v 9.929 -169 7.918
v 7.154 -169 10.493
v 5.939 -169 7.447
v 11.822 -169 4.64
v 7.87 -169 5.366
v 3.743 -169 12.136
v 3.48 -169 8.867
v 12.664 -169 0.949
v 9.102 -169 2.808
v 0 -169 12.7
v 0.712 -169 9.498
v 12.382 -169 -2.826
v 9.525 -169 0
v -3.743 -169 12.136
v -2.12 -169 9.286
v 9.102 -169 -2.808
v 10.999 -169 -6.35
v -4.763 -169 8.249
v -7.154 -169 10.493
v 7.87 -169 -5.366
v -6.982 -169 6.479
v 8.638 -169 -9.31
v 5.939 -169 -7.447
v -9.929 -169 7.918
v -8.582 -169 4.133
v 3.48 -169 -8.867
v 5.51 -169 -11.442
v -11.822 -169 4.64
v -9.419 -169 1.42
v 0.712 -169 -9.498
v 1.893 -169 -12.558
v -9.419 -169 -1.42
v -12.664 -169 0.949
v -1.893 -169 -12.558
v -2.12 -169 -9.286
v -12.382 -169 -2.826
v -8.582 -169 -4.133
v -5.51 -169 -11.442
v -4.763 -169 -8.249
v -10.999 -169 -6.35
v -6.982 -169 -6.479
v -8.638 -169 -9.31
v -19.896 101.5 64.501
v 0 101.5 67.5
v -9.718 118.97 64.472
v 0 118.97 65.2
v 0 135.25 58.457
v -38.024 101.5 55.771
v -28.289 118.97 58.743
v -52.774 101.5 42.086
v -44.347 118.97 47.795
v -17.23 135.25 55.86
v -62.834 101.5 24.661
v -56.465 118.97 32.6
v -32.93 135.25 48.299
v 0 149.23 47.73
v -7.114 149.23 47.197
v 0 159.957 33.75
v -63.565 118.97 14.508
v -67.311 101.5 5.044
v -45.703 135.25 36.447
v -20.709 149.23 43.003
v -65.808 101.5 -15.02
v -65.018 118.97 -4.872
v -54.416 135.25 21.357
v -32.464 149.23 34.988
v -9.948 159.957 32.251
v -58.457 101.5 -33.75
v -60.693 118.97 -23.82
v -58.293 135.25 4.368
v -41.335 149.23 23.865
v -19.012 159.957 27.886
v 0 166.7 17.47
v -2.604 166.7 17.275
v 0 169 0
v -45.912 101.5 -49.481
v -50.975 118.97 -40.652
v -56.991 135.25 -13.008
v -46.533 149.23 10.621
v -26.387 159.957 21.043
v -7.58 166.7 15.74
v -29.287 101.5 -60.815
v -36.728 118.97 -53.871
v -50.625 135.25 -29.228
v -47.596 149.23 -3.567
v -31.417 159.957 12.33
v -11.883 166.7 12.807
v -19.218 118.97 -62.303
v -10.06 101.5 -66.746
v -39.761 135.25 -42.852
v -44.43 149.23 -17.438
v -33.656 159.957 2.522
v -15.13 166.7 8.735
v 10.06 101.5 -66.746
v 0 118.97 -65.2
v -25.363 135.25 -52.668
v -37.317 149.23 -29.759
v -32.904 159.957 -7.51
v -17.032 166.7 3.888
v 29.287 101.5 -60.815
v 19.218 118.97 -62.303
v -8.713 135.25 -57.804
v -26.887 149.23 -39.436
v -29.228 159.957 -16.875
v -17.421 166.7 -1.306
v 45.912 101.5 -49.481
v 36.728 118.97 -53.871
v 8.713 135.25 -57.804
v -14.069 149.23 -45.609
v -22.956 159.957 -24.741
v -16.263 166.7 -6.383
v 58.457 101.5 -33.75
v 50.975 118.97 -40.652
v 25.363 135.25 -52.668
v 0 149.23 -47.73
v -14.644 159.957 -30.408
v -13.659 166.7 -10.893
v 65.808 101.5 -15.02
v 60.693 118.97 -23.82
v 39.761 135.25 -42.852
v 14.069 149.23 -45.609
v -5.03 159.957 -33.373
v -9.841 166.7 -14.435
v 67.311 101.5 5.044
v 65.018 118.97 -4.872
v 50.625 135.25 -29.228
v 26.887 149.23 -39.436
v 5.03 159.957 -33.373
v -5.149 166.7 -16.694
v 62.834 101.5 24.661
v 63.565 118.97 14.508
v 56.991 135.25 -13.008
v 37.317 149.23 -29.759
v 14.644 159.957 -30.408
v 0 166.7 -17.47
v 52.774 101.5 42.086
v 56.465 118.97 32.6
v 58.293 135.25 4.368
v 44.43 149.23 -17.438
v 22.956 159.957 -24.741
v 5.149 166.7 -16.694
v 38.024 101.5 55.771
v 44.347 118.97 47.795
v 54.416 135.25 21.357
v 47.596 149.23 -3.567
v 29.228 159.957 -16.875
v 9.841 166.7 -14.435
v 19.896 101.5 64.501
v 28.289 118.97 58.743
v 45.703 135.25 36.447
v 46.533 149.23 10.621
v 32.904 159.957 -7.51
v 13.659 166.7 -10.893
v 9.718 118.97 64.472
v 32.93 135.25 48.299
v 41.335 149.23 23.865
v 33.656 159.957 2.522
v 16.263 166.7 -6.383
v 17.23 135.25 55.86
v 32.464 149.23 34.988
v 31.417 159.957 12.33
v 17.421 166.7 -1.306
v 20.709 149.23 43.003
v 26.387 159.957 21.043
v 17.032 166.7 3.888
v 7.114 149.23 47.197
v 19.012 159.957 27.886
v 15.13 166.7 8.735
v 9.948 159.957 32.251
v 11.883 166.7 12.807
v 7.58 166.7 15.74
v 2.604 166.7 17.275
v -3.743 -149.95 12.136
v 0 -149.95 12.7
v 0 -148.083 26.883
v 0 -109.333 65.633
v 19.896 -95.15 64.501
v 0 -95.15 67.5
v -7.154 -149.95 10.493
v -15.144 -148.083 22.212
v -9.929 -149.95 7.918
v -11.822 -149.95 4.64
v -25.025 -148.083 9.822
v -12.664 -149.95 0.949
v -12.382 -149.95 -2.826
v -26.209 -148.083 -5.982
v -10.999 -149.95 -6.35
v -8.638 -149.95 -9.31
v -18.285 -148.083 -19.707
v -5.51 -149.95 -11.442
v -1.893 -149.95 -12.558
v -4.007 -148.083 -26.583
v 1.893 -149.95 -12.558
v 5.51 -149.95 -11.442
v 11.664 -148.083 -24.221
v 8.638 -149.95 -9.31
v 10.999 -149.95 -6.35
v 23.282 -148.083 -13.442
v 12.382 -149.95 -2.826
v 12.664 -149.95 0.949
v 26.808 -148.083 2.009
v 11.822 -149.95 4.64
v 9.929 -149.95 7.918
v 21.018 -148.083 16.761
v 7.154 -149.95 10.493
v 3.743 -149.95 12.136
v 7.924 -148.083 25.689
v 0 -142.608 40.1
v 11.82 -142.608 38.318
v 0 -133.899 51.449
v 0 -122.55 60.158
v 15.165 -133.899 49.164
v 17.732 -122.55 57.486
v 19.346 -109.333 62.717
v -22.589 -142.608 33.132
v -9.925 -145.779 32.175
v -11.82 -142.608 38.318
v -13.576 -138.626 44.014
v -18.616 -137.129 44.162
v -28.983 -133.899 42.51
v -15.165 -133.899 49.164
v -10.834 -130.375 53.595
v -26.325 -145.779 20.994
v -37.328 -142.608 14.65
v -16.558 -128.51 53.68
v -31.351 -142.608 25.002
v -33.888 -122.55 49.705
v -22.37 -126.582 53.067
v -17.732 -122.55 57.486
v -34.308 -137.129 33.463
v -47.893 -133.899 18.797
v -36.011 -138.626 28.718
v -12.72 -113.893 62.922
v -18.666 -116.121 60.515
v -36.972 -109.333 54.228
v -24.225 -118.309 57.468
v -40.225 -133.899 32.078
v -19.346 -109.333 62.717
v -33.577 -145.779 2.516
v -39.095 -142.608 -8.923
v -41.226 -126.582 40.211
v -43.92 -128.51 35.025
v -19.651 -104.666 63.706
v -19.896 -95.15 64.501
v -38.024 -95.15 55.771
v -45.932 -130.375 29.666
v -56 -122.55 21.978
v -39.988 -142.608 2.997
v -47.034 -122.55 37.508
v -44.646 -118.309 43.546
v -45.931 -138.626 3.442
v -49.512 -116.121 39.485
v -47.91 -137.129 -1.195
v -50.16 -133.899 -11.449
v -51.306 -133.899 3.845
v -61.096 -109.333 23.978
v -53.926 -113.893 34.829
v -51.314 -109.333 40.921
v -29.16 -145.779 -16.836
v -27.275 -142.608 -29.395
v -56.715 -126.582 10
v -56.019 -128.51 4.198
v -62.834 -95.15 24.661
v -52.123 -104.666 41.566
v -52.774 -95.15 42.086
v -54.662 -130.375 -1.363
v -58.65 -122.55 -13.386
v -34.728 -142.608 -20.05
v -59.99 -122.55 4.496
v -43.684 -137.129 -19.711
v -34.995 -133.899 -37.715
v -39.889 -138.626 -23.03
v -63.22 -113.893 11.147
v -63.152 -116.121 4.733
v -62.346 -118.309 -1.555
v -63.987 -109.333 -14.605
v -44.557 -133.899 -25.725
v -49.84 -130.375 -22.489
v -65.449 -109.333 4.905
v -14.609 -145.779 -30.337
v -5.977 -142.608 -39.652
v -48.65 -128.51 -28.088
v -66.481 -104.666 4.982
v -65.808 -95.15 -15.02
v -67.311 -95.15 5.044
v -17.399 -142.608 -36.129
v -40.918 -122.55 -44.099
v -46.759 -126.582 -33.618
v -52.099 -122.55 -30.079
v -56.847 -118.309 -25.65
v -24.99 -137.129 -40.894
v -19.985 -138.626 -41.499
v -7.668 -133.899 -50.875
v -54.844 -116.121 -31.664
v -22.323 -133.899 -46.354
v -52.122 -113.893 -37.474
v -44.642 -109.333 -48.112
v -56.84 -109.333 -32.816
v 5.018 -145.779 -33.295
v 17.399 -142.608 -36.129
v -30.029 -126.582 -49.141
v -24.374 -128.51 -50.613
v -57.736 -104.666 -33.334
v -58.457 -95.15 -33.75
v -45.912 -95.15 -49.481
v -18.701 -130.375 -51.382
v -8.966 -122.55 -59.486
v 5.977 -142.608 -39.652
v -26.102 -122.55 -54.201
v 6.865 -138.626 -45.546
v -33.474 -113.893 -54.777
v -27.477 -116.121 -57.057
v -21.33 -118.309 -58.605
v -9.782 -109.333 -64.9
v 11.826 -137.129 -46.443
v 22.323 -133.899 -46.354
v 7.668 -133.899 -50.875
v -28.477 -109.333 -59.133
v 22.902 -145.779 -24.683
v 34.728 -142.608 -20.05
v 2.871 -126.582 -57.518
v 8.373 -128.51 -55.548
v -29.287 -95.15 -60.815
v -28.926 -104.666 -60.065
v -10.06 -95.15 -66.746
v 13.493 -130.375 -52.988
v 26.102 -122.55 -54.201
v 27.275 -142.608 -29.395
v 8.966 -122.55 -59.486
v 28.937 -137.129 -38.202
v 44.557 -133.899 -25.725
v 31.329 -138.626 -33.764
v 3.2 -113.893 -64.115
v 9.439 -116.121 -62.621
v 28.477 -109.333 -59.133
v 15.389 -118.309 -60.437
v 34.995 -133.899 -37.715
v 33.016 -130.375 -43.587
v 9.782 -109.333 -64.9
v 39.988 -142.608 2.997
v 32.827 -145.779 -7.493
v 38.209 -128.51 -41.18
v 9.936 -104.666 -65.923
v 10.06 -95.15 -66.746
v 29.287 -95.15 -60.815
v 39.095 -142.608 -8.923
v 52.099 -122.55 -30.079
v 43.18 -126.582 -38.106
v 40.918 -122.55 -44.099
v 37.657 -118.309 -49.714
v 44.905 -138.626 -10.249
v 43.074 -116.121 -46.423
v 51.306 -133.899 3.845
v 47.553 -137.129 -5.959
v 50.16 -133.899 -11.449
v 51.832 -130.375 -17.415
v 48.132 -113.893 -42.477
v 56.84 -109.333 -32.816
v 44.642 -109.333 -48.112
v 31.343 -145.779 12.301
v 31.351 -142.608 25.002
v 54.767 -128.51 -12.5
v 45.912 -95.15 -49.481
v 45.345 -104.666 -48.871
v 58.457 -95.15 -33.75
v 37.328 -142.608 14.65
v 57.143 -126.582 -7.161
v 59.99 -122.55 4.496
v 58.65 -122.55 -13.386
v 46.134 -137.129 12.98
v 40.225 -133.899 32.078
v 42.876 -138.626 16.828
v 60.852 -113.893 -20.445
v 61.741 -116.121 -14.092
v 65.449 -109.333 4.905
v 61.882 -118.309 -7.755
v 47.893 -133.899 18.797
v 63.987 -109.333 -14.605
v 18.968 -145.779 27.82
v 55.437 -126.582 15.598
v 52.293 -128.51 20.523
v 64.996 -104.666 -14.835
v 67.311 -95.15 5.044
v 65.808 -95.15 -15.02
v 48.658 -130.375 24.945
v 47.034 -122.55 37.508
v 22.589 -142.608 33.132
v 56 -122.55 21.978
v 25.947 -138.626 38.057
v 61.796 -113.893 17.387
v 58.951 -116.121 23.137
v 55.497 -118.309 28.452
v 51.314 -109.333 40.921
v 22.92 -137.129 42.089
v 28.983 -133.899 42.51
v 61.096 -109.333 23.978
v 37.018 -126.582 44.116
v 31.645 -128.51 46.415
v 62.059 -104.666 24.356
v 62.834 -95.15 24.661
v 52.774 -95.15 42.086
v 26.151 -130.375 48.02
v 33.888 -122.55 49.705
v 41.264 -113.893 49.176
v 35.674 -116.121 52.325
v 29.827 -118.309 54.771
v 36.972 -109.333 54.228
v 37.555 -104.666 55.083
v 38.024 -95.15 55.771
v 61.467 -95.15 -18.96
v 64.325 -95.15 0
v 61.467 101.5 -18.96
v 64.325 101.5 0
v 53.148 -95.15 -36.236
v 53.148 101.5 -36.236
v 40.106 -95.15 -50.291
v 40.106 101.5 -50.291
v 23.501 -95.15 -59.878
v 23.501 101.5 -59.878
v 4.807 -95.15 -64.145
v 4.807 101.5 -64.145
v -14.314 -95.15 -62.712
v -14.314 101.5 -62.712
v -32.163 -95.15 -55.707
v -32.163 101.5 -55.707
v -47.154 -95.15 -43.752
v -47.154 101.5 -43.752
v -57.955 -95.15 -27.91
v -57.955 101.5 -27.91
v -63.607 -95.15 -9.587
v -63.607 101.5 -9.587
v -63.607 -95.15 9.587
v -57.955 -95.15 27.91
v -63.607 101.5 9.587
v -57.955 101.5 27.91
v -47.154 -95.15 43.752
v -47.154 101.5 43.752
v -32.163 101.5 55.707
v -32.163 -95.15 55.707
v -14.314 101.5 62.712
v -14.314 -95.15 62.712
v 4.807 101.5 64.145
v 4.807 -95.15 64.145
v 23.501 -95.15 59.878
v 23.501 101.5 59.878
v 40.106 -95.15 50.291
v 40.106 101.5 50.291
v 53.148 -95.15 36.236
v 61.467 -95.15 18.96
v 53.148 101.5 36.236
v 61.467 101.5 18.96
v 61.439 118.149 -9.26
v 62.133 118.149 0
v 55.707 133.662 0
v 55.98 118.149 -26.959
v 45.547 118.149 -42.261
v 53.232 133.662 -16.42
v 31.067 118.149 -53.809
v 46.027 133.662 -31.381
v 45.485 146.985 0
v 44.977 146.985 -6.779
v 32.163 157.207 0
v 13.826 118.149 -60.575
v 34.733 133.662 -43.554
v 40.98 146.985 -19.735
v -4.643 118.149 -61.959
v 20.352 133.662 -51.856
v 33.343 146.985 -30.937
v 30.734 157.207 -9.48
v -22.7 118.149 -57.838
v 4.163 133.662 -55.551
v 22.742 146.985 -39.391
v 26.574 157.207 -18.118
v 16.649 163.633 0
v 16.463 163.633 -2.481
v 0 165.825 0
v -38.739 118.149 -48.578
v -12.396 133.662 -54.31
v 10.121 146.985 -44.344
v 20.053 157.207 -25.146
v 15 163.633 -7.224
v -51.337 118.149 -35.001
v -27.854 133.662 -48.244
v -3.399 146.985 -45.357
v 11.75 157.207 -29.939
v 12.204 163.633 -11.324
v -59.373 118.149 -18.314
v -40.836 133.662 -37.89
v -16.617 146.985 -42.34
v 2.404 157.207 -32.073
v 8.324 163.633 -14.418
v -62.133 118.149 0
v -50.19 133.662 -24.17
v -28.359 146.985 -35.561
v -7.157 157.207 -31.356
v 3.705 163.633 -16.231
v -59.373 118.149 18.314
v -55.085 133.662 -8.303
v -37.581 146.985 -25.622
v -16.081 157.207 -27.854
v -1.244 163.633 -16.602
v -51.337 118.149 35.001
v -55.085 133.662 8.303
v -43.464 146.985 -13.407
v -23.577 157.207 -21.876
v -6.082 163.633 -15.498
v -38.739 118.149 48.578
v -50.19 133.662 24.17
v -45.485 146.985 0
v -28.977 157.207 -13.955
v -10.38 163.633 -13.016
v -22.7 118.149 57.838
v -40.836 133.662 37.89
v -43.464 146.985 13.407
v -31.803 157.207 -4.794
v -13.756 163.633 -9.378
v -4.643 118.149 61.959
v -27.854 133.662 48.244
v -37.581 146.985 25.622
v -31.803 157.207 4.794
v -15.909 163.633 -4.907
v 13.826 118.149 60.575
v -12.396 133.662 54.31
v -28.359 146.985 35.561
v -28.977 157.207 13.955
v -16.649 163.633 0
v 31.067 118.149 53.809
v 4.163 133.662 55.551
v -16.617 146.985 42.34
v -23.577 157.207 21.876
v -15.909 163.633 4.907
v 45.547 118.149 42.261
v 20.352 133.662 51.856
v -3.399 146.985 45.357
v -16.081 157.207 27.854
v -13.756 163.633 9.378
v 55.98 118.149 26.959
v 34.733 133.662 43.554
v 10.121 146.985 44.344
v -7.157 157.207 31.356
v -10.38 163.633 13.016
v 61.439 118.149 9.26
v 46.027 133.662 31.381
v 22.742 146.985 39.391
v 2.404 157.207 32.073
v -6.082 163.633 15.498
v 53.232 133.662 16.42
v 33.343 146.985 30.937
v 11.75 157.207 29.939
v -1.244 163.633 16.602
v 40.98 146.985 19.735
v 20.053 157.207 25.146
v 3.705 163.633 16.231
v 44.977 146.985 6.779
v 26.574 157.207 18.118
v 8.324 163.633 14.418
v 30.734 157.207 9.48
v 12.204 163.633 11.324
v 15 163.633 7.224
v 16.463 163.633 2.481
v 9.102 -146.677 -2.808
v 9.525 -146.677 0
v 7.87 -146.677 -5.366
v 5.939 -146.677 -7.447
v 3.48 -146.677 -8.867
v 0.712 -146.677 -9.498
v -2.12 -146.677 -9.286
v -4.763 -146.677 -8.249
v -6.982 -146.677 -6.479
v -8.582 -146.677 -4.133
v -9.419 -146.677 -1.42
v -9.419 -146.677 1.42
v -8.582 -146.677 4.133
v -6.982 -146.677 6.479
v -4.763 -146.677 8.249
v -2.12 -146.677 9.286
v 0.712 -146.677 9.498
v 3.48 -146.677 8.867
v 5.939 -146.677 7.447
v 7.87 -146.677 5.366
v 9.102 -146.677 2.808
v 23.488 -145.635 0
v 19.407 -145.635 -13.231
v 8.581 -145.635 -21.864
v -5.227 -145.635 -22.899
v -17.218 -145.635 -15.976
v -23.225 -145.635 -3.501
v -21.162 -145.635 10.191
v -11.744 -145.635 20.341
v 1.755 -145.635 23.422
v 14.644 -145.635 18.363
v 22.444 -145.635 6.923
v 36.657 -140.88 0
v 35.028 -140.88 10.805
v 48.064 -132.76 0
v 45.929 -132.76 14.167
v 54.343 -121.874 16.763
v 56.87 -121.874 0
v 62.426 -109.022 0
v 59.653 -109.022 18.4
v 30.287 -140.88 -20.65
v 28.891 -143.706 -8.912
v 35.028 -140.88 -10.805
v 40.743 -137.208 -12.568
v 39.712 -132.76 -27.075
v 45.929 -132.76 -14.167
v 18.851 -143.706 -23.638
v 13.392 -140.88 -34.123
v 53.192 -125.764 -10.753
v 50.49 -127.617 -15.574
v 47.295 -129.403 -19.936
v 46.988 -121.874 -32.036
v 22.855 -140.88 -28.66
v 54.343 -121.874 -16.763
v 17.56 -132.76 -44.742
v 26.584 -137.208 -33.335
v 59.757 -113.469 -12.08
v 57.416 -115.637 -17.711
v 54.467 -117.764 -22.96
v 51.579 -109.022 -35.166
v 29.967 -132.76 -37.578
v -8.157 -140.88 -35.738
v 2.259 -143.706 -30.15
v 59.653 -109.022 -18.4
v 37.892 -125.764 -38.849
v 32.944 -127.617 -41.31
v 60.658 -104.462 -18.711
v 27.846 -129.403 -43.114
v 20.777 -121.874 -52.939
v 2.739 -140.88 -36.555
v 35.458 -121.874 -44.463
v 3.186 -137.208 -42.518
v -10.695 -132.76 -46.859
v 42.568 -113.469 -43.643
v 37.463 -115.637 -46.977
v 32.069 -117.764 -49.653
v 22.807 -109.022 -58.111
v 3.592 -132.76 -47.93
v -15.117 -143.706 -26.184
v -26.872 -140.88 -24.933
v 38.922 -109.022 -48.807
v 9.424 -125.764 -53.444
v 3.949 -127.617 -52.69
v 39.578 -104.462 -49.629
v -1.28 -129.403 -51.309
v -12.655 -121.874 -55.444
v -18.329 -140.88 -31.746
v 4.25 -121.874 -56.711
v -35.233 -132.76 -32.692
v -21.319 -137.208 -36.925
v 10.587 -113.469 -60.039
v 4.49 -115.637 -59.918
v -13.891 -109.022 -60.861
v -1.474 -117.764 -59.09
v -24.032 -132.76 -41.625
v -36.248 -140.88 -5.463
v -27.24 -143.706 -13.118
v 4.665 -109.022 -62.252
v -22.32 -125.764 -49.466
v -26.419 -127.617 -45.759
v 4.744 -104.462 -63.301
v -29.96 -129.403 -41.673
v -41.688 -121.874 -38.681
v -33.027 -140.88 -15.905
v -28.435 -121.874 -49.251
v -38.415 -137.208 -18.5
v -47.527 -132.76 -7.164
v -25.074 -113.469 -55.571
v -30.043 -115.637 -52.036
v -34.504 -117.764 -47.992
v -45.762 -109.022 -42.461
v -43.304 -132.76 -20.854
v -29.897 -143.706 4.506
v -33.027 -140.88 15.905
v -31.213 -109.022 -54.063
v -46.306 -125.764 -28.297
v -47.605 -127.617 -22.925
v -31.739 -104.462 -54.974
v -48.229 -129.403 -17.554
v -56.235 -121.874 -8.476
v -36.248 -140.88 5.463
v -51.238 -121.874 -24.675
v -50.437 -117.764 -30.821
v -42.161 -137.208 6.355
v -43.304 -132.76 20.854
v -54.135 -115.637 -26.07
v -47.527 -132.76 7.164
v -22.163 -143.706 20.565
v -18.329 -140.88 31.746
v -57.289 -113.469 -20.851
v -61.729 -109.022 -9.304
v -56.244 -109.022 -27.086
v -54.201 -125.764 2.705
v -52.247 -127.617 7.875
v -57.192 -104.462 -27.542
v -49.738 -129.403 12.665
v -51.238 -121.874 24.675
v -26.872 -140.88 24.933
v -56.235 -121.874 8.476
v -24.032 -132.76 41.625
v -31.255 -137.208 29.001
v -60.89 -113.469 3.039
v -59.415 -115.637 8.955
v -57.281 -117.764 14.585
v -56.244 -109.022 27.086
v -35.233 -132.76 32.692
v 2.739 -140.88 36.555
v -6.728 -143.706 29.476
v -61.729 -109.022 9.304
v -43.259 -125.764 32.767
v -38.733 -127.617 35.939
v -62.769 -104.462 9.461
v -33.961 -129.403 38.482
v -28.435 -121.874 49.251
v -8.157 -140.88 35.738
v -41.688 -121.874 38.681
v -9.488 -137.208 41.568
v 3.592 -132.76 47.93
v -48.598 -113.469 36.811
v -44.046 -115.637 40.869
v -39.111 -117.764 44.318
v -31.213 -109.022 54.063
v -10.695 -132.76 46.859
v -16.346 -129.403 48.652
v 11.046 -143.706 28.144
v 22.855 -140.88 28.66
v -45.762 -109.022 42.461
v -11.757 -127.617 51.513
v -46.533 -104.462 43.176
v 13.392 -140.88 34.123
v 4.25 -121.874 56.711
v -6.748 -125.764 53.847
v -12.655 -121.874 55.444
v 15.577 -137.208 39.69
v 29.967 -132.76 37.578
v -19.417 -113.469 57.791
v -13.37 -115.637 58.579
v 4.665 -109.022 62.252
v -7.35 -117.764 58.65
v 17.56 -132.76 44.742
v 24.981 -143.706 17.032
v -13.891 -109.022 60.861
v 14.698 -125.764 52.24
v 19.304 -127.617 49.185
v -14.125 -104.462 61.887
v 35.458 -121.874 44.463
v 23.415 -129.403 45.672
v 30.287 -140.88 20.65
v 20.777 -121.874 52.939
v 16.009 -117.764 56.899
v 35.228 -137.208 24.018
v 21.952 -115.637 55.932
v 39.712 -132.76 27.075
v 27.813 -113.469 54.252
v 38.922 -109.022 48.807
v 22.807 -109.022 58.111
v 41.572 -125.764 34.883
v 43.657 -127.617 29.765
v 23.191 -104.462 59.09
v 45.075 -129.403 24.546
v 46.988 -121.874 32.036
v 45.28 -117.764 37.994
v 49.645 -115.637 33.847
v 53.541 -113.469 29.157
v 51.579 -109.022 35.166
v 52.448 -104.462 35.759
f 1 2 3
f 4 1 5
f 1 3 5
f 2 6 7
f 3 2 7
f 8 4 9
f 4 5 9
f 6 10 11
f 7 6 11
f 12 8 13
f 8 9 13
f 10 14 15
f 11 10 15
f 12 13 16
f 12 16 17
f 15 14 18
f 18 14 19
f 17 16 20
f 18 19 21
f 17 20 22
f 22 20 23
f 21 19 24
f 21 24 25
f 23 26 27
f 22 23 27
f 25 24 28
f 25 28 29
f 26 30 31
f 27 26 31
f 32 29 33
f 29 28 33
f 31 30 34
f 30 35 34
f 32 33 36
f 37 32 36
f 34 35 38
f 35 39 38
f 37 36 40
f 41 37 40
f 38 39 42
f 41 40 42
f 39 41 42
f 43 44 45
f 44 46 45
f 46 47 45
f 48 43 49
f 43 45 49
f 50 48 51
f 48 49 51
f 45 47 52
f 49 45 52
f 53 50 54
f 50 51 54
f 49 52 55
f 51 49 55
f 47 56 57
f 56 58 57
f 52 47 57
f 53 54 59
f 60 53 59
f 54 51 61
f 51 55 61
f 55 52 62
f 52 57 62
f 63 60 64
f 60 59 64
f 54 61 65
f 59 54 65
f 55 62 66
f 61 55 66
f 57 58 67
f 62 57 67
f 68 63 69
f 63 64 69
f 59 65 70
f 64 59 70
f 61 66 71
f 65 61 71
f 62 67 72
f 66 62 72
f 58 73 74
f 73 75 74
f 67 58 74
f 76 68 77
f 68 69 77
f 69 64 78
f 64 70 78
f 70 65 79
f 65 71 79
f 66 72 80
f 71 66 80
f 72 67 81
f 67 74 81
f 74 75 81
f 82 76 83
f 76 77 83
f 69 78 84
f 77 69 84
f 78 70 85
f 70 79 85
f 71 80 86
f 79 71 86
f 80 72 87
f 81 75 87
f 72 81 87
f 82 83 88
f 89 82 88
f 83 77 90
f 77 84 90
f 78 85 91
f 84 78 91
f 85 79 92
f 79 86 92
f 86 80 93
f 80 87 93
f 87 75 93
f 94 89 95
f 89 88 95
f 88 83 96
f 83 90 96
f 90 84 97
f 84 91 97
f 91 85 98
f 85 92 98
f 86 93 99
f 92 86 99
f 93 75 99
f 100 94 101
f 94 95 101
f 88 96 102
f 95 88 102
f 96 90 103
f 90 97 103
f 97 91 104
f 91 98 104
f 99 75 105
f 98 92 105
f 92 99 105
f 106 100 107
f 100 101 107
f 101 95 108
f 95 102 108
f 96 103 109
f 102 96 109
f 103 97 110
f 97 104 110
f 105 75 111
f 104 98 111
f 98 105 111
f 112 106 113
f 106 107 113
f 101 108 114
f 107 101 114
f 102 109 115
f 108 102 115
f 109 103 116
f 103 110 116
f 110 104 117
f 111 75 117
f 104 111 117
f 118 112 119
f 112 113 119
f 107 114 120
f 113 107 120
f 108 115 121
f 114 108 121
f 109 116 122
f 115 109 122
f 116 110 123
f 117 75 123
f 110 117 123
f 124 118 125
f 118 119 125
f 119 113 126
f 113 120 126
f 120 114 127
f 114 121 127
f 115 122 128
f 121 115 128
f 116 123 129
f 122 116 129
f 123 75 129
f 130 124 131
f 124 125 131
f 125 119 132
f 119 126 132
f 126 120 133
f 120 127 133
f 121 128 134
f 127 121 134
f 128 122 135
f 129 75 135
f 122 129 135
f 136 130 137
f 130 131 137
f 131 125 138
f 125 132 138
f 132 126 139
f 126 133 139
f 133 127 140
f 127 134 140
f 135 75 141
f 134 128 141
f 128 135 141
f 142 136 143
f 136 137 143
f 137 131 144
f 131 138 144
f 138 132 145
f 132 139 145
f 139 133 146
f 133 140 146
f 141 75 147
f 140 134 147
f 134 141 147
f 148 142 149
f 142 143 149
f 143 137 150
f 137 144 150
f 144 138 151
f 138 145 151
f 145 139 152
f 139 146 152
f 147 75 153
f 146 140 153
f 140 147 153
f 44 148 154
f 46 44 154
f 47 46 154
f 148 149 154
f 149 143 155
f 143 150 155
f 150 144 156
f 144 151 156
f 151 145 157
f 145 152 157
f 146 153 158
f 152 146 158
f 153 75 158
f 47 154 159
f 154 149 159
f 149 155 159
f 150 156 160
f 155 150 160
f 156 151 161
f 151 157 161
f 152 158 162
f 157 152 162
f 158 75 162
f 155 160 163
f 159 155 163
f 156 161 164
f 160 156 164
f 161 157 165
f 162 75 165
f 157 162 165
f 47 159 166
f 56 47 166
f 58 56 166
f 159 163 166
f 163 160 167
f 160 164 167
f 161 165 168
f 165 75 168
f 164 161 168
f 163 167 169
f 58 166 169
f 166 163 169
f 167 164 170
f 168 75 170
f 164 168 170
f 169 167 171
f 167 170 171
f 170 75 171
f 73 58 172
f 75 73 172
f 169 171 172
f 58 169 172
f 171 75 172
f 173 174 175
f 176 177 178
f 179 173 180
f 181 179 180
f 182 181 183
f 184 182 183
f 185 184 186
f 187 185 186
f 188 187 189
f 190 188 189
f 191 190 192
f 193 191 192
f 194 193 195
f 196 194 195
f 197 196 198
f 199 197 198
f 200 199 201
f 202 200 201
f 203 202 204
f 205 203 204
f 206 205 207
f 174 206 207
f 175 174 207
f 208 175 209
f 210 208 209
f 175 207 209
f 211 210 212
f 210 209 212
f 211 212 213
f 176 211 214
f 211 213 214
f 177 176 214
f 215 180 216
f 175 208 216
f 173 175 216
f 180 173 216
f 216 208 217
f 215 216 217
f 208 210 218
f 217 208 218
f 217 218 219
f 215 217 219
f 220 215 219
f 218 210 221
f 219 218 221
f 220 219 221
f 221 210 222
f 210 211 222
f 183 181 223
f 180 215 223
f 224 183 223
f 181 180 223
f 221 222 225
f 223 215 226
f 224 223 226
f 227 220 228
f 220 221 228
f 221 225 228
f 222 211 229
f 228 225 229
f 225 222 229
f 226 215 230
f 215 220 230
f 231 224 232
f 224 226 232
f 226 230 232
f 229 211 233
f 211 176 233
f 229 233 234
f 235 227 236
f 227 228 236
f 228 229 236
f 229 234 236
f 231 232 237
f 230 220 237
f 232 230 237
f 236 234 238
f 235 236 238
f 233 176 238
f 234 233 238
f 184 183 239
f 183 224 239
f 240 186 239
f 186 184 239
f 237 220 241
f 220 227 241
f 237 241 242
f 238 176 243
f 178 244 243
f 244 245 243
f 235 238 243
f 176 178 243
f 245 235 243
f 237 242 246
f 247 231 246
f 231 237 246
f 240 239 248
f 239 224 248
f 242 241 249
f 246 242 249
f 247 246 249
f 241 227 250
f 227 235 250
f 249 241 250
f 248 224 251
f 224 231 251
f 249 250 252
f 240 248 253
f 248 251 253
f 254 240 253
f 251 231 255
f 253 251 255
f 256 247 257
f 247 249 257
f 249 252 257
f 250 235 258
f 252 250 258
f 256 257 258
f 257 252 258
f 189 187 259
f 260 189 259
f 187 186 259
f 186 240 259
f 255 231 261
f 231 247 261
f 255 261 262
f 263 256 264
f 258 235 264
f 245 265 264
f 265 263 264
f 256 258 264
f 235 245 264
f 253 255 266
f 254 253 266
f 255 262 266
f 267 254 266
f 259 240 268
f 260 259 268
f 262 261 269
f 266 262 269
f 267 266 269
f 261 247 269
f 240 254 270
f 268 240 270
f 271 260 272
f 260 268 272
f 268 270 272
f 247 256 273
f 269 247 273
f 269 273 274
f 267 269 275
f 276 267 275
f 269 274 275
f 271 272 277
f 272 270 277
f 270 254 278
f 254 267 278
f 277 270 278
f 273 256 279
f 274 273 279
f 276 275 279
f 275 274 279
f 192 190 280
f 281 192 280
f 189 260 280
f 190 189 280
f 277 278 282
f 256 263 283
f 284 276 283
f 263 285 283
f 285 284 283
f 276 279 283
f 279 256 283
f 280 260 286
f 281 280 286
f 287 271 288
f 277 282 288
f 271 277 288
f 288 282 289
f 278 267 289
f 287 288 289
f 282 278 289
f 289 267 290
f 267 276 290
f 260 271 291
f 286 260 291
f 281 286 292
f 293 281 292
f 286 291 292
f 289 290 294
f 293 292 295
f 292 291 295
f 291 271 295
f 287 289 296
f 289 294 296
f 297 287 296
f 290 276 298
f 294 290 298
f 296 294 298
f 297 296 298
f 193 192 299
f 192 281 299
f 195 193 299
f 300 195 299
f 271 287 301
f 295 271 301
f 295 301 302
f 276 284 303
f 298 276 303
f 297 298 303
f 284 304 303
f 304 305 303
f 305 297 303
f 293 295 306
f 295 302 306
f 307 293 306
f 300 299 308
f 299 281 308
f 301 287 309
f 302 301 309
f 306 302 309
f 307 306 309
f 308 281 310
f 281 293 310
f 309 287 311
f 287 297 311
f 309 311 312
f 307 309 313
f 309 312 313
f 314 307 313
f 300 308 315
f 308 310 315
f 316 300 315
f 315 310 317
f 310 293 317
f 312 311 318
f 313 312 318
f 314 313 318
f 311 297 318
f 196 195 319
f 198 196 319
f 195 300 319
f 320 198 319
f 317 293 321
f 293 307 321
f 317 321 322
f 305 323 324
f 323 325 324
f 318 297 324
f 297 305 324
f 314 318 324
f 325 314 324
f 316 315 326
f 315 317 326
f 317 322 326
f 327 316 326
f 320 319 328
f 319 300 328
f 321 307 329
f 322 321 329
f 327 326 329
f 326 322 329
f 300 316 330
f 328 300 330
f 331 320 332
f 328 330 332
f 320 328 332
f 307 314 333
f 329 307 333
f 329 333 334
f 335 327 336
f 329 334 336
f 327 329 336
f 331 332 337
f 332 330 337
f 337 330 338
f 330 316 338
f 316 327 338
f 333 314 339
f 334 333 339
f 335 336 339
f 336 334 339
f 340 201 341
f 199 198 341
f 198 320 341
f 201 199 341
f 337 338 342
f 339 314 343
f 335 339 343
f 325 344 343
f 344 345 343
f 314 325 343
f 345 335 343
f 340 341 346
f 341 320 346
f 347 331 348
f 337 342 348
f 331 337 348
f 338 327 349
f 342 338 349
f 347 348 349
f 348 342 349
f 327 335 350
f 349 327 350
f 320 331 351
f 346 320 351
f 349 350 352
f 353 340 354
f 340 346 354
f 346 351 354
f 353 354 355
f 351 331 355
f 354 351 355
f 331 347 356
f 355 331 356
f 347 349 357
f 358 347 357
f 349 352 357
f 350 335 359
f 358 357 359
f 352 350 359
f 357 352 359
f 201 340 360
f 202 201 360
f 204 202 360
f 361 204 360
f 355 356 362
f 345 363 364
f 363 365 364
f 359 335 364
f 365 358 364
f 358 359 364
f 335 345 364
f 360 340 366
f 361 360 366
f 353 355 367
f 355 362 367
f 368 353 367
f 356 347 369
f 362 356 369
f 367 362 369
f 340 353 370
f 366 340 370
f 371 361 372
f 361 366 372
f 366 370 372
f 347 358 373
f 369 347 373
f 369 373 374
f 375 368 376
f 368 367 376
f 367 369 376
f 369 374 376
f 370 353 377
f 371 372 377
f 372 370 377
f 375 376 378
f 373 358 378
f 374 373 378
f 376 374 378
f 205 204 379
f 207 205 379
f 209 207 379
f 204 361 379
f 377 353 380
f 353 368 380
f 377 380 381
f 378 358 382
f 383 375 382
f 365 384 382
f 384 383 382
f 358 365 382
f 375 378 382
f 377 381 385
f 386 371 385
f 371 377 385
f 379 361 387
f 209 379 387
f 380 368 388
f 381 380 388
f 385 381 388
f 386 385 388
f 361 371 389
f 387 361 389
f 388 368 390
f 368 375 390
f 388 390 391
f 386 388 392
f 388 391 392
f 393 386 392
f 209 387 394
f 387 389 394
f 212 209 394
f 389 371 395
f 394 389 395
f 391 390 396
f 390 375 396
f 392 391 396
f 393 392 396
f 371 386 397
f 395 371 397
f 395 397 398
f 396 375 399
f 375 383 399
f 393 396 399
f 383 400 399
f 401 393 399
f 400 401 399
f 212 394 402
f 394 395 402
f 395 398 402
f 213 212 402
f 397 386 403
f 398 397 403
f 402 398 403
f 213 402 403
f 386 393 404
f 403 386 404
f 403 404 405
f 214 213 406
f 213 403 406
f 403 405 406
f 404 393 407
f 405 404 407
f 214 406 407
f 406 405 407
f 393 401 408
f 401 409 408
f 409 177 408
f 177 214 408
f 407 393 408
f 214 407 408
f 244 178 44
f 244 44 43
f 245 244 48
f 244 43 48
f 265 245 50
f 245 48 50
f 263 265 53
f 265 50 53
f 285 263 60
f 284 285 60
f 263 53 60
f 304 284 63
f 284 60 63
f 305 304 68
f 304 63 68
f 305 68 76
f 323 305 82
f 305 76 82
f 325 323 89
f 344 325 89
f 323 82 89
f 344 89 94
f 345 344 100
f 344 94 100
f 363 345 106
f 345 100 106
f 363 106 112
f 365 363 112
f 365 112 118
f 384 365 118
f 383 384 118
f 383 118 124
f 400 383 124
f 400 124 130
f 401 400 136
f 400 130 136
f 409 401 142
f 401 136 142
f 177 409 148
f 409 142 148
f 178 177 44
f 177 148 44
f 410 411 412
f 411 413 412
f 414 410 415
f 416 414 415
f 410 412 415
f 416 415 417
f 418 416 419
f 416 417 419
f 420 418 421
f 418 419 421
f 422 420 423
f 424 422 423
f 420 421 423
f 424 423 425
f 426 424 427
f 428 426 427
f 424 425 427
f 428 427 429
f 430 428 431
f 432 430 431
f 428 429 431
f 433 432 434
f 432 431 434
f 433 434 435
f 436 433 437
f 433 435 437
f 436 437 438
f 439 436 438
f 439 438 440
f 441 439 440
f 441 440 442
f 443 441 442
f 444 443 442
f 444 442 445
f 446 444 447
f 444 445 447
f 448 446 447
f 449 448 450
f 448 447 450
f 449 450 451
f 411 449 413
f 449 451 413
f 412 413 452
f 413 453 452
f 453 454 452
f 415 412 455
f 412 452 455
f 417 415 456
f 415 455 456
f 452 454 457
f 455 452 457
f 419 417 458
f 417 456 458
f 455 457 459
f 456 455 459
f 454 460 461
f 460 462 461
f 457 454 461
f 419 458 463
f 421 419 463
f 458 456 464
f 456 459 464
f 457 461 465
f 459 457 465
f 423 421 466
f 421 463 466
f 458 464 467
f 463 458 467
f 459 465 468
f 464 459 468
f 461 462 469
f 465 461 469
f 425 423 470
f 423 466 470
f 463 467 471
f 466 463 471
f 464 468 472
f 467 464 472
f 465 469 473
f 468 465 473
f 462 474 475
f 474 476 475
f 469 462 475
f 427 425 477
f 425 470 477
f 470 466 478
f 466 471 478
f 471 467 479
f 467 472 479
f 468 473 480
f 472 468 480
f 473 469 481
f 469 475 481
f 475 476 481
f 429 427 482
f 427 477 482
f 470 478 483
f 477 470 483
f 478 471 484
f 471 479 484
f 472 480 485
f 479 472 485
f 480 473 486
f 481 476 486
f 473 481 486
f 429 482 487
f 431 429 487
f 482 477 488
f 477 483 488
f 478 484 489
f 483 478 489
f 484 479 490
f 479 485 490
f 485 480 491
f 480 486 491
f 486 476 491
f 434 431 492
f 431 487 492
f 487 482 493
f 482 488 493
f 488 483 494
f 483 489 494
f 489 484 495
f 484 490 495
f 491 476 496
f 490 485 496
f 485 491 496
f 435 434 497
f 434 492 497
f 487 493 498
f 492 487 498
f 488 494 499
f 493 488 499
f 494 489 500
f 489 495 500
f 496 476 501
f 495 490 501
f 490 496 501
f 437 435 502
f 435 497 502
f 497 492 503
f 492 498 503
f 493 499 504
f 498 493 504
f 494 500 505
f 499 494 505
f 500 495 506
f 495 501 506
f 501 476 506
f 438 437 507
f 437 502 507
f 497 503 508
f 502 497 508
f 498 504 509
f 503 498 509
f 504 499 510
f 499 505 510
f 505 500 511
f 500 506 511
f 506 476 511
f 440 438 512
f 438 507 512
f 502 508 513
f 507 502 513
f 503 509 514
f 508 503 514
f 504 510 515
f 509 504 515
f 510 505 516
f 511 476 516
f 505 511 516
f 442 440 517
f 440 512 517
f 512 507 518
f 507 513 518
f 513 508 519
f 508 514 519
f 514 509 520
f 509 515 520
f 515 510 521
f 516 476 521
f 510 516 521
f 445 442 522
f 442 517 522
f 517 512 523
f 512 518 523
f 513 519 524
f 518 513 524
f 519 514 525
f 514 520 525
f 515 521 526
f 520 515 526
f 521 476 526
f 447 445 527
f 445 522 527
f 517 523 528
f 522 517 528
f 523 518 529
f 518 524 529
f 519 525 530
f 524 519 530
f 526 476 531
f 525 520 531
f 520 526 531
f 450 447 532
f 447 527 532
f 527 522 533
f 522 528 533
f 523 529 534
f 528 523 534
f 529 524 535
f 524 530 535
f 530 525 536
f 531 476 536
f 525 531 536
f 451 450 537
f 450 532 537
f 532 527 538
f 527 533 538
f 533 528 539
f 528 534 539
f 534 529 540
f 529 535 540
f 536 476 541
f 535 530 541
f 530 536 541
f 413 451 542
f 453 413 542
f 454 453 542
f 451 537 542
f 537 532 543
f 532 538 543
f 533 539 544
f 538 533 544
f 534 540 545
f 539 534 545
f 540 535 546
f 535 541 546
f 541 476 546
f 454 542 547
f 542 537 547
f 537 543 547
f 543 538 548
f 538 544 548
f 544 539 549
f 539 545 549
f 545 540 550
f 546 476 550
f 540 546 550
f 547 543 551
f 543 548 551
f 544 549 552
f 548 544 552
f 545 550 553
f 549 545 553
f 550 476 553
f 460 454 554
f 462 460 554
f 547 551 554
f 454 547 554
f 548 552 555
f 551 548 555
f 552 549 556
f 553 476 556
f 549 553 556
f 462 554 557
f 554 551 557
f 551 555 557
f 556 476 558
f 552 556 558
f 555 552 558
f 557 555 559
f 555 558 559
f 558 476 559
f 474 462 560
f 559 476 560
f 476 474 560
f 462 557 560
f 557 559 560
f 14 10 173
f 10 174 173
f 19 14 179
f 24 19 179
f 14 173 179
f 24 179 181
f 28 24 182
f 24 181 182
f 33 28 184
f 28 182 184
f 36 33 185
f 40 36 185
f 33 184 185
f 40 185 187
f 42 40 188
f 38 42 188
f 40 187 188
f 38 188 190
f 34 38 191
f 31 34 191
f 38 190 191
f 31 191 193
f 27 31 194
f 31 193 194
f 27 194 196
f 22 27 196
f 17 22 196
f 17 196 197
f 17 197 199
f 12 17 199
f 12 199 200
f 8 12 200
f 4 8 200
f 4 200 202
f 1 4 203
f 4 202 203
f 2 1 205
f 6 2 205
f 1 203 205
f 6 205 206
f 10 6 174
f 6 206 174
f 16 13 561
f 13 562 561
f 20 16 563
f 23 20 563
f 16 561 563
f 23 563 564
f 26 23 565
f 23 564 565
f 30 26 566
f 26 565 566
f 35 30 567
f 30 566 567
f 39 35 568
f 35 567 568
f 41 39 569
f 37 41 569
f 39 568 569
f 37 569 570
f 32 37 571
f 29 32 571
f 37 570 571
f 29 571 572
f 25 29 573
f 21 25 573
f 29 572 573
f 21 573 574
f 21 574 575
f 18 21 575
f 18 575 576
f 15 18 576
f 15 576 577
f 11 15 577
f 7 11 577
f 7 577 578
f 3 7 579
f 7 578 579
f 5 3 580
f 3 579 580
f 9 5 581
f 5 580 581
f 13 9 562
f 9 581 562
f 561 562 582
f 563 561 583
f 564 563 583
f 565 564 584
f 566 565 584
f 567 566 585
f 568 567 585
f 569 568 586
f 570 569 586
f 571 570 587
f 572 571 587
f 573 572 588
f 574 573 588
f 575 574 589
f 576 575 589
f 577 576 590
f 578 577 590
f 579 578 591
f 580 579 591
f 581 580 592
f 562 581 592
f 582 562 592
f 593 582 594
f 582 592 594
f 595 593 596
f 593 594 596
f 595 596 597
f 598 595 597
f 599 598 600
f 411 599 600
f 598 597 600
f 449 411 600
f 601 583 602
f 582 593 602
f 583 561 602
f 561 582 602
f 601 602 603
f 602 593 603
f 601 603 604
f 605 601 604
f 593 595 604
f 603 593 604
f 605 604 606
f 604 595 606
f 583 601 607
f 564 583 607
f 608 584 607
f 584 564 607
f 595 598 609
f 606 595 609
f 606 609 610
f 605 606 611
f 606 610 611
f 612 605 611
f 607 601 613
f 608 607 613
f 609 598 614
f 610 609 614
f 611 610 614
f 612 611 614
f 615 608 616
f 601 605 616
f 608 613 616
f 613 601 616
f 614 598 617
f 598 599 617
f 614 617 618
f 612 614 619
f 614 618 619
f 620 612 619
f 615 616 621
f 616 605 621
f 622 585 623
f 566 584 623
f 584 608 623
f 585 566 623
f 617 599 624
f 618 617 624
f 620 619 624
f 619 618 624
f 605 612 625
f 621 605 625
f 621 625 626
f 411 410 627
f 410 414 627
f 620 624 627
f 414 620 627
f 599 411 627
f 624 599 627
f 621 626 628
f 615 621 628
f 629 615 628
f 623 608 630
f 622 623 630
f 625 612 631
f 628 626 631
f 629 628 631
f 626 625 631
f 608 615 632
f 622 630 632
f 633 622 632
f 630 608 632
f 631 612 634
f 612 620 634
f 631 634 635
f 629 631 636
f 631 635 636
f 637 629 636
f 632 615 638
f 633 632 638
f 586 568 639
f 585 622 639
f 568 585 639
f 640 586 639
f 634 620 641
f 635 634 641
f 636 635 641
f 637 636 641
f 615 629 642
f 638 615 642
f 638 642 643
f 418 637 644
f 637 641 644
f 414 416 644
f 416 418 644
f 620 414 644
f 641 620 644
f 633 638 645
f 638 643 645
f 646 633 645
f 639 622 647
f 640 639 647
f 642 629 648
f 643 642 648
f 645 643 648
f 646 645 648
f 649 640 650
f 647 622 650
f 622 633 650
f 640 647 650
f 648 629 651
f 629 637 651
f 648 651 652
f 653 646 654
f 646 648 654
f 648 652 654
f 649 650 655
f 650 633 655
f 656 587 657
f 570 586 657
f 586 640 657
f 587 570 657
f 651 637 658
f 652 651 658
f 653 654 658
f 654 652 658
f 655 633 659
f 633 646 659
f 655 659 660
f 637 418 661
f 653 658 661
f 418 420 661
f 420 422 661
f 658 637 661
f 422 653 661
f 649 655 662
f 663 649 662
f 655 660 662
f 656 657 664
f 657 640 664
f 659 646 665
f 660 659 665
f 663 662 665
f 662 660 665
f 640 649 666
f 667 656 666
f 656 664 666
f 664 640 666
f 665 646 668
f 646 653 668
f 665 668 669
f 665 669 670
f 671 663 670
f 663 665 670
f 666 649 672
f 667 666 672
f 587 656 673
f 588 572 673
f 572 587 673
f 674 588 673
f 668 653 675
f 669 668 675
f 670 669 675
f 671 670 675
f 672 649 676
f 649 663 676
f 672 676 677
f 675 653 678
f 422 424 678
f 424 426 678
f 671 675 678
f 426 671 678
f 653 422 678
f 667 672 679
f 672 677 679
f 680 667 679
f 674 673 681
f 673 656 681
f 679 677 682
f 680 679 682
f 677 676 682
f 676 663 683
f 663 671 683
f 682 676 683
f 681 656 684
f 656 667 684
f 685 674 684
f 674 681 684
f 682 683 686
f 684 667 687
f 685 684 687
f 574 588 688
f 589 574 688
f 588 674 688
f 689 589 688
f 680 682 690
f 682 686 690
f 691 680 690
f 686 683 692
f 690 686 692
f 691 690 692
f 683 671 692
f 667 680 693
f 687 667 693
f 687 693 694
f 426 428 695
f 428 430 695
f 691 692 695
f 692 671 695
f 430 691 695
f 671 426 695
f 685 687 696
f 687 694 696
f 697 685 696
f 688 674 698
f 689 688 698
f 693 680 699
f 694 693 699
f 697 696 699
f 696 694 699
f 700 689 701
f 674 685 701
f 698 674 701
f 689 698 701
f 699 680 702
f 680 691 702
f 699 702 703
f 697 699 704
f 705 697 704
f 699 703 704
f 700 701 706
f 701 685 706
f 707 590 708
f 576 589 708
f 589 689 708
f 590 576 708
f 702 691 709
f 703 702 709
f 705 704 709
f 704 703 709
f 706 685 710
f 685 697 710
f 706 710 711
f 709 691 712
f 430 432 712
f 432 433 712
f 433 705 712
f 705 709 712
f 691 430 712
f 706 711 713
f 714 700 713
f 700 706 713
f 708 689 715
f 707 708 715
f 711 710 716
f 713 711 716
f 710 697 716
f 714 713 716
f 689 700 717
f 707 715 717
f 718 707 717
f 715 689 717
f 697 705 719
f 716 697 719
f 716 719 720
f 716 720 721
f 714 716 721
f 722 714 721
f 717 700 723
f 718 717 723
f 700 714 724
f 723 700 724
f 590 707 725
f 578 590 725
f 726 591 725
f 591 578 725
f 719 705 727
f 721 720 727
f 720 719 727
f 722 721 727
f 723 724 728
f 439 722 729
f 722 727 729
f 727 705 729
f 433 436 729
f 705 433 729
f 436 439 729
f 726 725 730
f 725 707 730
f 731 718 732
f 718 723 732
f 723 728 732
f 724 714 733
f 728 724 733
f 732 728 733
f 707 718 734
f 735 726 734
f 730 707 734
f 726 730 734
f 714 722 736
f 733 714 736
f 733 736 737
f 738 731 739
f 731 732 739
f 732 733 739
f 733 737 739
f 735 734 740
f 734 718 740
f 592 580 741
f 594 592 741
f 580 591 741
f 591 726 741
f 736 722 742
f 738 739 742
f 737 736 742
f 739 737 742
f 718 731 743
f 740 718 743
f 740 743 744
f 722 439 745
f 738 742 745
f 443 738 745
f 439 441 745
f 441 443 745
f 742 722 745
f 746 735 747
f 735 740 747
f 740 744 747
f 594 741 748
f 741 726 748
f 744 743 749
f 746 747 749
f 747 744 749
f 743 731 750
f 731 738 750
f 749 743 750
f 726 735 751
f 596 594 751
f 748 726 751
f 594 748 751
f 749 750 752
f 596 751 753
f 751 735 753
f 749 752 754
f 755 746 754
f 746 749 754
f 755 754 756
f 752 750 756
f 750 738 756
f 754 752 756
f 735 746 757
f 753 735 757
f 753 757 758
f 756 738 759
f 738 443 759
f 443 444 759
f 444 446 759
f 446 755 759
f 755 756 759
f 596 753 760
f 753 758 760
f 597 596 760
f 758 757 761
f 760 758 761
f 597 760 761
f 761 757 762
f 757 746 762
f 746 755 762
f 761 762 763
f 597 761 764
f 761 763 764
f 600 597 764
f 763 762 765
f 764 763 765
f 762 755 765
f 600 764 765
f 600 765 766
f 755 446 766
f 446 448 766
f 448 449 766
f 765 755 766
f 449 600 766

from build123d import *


# Read off the part's stored shape, not the designer's step: Shell1
with BuildPart() as part:
    # Sketch1 → Revolve1 (revolve)
    with BuildSketch(Plane.XY, mode=Mode.PRIVATE) as revolve1_sk:
        with BuildLine():
            Line((0, 169), (0, -169))
            Line((0, -169), (-12.7, -169))
            Line((-12.7, -169), (-12.7, -149.95))
            ThreePointArc((-12.7, -149.95), (-51.449451609, -133.899451609), (-67.5, -95.15))
            Line((-67.5, -95.15), (-67.5, 101.5))
            ThreePointArc((-67.5, 101.5), (-47.72970773, 149.22970773), (0, 169))
        make_face()
    revolve(revolve1_sk.sketch.rotate(Axis((0, 169, 0), (0, -1, 0)), 270), axis=Axis((0, 169, 0), (0, -1, 0)))

    # Shell1 outline → Shell1 (revolve, cut)
    with BuildSketch(Plane.XY):
        with BuildLine():
            Line((64.325, -95.15), (64.325, 101.499999979))
            ThreePointArc((64.325, 101.499999979), (45.484643708, 146.984643692), (0, 165.825))
            Line((0, 165.825), (0, -169))
            Line((0, -169), (9.525, -169))
            Line((9.525, -169), (9.525, -146.677274331))
            ThreePointArc((9.525, -146.677274331), (48.06404424, -132.760171497), (64.325, -95.15))
        make_face()
    revolve(axis=Axis((0, 0, 0), (0, 1, 0)), mode=Mode.SUBTRACT)


solid = part.part
